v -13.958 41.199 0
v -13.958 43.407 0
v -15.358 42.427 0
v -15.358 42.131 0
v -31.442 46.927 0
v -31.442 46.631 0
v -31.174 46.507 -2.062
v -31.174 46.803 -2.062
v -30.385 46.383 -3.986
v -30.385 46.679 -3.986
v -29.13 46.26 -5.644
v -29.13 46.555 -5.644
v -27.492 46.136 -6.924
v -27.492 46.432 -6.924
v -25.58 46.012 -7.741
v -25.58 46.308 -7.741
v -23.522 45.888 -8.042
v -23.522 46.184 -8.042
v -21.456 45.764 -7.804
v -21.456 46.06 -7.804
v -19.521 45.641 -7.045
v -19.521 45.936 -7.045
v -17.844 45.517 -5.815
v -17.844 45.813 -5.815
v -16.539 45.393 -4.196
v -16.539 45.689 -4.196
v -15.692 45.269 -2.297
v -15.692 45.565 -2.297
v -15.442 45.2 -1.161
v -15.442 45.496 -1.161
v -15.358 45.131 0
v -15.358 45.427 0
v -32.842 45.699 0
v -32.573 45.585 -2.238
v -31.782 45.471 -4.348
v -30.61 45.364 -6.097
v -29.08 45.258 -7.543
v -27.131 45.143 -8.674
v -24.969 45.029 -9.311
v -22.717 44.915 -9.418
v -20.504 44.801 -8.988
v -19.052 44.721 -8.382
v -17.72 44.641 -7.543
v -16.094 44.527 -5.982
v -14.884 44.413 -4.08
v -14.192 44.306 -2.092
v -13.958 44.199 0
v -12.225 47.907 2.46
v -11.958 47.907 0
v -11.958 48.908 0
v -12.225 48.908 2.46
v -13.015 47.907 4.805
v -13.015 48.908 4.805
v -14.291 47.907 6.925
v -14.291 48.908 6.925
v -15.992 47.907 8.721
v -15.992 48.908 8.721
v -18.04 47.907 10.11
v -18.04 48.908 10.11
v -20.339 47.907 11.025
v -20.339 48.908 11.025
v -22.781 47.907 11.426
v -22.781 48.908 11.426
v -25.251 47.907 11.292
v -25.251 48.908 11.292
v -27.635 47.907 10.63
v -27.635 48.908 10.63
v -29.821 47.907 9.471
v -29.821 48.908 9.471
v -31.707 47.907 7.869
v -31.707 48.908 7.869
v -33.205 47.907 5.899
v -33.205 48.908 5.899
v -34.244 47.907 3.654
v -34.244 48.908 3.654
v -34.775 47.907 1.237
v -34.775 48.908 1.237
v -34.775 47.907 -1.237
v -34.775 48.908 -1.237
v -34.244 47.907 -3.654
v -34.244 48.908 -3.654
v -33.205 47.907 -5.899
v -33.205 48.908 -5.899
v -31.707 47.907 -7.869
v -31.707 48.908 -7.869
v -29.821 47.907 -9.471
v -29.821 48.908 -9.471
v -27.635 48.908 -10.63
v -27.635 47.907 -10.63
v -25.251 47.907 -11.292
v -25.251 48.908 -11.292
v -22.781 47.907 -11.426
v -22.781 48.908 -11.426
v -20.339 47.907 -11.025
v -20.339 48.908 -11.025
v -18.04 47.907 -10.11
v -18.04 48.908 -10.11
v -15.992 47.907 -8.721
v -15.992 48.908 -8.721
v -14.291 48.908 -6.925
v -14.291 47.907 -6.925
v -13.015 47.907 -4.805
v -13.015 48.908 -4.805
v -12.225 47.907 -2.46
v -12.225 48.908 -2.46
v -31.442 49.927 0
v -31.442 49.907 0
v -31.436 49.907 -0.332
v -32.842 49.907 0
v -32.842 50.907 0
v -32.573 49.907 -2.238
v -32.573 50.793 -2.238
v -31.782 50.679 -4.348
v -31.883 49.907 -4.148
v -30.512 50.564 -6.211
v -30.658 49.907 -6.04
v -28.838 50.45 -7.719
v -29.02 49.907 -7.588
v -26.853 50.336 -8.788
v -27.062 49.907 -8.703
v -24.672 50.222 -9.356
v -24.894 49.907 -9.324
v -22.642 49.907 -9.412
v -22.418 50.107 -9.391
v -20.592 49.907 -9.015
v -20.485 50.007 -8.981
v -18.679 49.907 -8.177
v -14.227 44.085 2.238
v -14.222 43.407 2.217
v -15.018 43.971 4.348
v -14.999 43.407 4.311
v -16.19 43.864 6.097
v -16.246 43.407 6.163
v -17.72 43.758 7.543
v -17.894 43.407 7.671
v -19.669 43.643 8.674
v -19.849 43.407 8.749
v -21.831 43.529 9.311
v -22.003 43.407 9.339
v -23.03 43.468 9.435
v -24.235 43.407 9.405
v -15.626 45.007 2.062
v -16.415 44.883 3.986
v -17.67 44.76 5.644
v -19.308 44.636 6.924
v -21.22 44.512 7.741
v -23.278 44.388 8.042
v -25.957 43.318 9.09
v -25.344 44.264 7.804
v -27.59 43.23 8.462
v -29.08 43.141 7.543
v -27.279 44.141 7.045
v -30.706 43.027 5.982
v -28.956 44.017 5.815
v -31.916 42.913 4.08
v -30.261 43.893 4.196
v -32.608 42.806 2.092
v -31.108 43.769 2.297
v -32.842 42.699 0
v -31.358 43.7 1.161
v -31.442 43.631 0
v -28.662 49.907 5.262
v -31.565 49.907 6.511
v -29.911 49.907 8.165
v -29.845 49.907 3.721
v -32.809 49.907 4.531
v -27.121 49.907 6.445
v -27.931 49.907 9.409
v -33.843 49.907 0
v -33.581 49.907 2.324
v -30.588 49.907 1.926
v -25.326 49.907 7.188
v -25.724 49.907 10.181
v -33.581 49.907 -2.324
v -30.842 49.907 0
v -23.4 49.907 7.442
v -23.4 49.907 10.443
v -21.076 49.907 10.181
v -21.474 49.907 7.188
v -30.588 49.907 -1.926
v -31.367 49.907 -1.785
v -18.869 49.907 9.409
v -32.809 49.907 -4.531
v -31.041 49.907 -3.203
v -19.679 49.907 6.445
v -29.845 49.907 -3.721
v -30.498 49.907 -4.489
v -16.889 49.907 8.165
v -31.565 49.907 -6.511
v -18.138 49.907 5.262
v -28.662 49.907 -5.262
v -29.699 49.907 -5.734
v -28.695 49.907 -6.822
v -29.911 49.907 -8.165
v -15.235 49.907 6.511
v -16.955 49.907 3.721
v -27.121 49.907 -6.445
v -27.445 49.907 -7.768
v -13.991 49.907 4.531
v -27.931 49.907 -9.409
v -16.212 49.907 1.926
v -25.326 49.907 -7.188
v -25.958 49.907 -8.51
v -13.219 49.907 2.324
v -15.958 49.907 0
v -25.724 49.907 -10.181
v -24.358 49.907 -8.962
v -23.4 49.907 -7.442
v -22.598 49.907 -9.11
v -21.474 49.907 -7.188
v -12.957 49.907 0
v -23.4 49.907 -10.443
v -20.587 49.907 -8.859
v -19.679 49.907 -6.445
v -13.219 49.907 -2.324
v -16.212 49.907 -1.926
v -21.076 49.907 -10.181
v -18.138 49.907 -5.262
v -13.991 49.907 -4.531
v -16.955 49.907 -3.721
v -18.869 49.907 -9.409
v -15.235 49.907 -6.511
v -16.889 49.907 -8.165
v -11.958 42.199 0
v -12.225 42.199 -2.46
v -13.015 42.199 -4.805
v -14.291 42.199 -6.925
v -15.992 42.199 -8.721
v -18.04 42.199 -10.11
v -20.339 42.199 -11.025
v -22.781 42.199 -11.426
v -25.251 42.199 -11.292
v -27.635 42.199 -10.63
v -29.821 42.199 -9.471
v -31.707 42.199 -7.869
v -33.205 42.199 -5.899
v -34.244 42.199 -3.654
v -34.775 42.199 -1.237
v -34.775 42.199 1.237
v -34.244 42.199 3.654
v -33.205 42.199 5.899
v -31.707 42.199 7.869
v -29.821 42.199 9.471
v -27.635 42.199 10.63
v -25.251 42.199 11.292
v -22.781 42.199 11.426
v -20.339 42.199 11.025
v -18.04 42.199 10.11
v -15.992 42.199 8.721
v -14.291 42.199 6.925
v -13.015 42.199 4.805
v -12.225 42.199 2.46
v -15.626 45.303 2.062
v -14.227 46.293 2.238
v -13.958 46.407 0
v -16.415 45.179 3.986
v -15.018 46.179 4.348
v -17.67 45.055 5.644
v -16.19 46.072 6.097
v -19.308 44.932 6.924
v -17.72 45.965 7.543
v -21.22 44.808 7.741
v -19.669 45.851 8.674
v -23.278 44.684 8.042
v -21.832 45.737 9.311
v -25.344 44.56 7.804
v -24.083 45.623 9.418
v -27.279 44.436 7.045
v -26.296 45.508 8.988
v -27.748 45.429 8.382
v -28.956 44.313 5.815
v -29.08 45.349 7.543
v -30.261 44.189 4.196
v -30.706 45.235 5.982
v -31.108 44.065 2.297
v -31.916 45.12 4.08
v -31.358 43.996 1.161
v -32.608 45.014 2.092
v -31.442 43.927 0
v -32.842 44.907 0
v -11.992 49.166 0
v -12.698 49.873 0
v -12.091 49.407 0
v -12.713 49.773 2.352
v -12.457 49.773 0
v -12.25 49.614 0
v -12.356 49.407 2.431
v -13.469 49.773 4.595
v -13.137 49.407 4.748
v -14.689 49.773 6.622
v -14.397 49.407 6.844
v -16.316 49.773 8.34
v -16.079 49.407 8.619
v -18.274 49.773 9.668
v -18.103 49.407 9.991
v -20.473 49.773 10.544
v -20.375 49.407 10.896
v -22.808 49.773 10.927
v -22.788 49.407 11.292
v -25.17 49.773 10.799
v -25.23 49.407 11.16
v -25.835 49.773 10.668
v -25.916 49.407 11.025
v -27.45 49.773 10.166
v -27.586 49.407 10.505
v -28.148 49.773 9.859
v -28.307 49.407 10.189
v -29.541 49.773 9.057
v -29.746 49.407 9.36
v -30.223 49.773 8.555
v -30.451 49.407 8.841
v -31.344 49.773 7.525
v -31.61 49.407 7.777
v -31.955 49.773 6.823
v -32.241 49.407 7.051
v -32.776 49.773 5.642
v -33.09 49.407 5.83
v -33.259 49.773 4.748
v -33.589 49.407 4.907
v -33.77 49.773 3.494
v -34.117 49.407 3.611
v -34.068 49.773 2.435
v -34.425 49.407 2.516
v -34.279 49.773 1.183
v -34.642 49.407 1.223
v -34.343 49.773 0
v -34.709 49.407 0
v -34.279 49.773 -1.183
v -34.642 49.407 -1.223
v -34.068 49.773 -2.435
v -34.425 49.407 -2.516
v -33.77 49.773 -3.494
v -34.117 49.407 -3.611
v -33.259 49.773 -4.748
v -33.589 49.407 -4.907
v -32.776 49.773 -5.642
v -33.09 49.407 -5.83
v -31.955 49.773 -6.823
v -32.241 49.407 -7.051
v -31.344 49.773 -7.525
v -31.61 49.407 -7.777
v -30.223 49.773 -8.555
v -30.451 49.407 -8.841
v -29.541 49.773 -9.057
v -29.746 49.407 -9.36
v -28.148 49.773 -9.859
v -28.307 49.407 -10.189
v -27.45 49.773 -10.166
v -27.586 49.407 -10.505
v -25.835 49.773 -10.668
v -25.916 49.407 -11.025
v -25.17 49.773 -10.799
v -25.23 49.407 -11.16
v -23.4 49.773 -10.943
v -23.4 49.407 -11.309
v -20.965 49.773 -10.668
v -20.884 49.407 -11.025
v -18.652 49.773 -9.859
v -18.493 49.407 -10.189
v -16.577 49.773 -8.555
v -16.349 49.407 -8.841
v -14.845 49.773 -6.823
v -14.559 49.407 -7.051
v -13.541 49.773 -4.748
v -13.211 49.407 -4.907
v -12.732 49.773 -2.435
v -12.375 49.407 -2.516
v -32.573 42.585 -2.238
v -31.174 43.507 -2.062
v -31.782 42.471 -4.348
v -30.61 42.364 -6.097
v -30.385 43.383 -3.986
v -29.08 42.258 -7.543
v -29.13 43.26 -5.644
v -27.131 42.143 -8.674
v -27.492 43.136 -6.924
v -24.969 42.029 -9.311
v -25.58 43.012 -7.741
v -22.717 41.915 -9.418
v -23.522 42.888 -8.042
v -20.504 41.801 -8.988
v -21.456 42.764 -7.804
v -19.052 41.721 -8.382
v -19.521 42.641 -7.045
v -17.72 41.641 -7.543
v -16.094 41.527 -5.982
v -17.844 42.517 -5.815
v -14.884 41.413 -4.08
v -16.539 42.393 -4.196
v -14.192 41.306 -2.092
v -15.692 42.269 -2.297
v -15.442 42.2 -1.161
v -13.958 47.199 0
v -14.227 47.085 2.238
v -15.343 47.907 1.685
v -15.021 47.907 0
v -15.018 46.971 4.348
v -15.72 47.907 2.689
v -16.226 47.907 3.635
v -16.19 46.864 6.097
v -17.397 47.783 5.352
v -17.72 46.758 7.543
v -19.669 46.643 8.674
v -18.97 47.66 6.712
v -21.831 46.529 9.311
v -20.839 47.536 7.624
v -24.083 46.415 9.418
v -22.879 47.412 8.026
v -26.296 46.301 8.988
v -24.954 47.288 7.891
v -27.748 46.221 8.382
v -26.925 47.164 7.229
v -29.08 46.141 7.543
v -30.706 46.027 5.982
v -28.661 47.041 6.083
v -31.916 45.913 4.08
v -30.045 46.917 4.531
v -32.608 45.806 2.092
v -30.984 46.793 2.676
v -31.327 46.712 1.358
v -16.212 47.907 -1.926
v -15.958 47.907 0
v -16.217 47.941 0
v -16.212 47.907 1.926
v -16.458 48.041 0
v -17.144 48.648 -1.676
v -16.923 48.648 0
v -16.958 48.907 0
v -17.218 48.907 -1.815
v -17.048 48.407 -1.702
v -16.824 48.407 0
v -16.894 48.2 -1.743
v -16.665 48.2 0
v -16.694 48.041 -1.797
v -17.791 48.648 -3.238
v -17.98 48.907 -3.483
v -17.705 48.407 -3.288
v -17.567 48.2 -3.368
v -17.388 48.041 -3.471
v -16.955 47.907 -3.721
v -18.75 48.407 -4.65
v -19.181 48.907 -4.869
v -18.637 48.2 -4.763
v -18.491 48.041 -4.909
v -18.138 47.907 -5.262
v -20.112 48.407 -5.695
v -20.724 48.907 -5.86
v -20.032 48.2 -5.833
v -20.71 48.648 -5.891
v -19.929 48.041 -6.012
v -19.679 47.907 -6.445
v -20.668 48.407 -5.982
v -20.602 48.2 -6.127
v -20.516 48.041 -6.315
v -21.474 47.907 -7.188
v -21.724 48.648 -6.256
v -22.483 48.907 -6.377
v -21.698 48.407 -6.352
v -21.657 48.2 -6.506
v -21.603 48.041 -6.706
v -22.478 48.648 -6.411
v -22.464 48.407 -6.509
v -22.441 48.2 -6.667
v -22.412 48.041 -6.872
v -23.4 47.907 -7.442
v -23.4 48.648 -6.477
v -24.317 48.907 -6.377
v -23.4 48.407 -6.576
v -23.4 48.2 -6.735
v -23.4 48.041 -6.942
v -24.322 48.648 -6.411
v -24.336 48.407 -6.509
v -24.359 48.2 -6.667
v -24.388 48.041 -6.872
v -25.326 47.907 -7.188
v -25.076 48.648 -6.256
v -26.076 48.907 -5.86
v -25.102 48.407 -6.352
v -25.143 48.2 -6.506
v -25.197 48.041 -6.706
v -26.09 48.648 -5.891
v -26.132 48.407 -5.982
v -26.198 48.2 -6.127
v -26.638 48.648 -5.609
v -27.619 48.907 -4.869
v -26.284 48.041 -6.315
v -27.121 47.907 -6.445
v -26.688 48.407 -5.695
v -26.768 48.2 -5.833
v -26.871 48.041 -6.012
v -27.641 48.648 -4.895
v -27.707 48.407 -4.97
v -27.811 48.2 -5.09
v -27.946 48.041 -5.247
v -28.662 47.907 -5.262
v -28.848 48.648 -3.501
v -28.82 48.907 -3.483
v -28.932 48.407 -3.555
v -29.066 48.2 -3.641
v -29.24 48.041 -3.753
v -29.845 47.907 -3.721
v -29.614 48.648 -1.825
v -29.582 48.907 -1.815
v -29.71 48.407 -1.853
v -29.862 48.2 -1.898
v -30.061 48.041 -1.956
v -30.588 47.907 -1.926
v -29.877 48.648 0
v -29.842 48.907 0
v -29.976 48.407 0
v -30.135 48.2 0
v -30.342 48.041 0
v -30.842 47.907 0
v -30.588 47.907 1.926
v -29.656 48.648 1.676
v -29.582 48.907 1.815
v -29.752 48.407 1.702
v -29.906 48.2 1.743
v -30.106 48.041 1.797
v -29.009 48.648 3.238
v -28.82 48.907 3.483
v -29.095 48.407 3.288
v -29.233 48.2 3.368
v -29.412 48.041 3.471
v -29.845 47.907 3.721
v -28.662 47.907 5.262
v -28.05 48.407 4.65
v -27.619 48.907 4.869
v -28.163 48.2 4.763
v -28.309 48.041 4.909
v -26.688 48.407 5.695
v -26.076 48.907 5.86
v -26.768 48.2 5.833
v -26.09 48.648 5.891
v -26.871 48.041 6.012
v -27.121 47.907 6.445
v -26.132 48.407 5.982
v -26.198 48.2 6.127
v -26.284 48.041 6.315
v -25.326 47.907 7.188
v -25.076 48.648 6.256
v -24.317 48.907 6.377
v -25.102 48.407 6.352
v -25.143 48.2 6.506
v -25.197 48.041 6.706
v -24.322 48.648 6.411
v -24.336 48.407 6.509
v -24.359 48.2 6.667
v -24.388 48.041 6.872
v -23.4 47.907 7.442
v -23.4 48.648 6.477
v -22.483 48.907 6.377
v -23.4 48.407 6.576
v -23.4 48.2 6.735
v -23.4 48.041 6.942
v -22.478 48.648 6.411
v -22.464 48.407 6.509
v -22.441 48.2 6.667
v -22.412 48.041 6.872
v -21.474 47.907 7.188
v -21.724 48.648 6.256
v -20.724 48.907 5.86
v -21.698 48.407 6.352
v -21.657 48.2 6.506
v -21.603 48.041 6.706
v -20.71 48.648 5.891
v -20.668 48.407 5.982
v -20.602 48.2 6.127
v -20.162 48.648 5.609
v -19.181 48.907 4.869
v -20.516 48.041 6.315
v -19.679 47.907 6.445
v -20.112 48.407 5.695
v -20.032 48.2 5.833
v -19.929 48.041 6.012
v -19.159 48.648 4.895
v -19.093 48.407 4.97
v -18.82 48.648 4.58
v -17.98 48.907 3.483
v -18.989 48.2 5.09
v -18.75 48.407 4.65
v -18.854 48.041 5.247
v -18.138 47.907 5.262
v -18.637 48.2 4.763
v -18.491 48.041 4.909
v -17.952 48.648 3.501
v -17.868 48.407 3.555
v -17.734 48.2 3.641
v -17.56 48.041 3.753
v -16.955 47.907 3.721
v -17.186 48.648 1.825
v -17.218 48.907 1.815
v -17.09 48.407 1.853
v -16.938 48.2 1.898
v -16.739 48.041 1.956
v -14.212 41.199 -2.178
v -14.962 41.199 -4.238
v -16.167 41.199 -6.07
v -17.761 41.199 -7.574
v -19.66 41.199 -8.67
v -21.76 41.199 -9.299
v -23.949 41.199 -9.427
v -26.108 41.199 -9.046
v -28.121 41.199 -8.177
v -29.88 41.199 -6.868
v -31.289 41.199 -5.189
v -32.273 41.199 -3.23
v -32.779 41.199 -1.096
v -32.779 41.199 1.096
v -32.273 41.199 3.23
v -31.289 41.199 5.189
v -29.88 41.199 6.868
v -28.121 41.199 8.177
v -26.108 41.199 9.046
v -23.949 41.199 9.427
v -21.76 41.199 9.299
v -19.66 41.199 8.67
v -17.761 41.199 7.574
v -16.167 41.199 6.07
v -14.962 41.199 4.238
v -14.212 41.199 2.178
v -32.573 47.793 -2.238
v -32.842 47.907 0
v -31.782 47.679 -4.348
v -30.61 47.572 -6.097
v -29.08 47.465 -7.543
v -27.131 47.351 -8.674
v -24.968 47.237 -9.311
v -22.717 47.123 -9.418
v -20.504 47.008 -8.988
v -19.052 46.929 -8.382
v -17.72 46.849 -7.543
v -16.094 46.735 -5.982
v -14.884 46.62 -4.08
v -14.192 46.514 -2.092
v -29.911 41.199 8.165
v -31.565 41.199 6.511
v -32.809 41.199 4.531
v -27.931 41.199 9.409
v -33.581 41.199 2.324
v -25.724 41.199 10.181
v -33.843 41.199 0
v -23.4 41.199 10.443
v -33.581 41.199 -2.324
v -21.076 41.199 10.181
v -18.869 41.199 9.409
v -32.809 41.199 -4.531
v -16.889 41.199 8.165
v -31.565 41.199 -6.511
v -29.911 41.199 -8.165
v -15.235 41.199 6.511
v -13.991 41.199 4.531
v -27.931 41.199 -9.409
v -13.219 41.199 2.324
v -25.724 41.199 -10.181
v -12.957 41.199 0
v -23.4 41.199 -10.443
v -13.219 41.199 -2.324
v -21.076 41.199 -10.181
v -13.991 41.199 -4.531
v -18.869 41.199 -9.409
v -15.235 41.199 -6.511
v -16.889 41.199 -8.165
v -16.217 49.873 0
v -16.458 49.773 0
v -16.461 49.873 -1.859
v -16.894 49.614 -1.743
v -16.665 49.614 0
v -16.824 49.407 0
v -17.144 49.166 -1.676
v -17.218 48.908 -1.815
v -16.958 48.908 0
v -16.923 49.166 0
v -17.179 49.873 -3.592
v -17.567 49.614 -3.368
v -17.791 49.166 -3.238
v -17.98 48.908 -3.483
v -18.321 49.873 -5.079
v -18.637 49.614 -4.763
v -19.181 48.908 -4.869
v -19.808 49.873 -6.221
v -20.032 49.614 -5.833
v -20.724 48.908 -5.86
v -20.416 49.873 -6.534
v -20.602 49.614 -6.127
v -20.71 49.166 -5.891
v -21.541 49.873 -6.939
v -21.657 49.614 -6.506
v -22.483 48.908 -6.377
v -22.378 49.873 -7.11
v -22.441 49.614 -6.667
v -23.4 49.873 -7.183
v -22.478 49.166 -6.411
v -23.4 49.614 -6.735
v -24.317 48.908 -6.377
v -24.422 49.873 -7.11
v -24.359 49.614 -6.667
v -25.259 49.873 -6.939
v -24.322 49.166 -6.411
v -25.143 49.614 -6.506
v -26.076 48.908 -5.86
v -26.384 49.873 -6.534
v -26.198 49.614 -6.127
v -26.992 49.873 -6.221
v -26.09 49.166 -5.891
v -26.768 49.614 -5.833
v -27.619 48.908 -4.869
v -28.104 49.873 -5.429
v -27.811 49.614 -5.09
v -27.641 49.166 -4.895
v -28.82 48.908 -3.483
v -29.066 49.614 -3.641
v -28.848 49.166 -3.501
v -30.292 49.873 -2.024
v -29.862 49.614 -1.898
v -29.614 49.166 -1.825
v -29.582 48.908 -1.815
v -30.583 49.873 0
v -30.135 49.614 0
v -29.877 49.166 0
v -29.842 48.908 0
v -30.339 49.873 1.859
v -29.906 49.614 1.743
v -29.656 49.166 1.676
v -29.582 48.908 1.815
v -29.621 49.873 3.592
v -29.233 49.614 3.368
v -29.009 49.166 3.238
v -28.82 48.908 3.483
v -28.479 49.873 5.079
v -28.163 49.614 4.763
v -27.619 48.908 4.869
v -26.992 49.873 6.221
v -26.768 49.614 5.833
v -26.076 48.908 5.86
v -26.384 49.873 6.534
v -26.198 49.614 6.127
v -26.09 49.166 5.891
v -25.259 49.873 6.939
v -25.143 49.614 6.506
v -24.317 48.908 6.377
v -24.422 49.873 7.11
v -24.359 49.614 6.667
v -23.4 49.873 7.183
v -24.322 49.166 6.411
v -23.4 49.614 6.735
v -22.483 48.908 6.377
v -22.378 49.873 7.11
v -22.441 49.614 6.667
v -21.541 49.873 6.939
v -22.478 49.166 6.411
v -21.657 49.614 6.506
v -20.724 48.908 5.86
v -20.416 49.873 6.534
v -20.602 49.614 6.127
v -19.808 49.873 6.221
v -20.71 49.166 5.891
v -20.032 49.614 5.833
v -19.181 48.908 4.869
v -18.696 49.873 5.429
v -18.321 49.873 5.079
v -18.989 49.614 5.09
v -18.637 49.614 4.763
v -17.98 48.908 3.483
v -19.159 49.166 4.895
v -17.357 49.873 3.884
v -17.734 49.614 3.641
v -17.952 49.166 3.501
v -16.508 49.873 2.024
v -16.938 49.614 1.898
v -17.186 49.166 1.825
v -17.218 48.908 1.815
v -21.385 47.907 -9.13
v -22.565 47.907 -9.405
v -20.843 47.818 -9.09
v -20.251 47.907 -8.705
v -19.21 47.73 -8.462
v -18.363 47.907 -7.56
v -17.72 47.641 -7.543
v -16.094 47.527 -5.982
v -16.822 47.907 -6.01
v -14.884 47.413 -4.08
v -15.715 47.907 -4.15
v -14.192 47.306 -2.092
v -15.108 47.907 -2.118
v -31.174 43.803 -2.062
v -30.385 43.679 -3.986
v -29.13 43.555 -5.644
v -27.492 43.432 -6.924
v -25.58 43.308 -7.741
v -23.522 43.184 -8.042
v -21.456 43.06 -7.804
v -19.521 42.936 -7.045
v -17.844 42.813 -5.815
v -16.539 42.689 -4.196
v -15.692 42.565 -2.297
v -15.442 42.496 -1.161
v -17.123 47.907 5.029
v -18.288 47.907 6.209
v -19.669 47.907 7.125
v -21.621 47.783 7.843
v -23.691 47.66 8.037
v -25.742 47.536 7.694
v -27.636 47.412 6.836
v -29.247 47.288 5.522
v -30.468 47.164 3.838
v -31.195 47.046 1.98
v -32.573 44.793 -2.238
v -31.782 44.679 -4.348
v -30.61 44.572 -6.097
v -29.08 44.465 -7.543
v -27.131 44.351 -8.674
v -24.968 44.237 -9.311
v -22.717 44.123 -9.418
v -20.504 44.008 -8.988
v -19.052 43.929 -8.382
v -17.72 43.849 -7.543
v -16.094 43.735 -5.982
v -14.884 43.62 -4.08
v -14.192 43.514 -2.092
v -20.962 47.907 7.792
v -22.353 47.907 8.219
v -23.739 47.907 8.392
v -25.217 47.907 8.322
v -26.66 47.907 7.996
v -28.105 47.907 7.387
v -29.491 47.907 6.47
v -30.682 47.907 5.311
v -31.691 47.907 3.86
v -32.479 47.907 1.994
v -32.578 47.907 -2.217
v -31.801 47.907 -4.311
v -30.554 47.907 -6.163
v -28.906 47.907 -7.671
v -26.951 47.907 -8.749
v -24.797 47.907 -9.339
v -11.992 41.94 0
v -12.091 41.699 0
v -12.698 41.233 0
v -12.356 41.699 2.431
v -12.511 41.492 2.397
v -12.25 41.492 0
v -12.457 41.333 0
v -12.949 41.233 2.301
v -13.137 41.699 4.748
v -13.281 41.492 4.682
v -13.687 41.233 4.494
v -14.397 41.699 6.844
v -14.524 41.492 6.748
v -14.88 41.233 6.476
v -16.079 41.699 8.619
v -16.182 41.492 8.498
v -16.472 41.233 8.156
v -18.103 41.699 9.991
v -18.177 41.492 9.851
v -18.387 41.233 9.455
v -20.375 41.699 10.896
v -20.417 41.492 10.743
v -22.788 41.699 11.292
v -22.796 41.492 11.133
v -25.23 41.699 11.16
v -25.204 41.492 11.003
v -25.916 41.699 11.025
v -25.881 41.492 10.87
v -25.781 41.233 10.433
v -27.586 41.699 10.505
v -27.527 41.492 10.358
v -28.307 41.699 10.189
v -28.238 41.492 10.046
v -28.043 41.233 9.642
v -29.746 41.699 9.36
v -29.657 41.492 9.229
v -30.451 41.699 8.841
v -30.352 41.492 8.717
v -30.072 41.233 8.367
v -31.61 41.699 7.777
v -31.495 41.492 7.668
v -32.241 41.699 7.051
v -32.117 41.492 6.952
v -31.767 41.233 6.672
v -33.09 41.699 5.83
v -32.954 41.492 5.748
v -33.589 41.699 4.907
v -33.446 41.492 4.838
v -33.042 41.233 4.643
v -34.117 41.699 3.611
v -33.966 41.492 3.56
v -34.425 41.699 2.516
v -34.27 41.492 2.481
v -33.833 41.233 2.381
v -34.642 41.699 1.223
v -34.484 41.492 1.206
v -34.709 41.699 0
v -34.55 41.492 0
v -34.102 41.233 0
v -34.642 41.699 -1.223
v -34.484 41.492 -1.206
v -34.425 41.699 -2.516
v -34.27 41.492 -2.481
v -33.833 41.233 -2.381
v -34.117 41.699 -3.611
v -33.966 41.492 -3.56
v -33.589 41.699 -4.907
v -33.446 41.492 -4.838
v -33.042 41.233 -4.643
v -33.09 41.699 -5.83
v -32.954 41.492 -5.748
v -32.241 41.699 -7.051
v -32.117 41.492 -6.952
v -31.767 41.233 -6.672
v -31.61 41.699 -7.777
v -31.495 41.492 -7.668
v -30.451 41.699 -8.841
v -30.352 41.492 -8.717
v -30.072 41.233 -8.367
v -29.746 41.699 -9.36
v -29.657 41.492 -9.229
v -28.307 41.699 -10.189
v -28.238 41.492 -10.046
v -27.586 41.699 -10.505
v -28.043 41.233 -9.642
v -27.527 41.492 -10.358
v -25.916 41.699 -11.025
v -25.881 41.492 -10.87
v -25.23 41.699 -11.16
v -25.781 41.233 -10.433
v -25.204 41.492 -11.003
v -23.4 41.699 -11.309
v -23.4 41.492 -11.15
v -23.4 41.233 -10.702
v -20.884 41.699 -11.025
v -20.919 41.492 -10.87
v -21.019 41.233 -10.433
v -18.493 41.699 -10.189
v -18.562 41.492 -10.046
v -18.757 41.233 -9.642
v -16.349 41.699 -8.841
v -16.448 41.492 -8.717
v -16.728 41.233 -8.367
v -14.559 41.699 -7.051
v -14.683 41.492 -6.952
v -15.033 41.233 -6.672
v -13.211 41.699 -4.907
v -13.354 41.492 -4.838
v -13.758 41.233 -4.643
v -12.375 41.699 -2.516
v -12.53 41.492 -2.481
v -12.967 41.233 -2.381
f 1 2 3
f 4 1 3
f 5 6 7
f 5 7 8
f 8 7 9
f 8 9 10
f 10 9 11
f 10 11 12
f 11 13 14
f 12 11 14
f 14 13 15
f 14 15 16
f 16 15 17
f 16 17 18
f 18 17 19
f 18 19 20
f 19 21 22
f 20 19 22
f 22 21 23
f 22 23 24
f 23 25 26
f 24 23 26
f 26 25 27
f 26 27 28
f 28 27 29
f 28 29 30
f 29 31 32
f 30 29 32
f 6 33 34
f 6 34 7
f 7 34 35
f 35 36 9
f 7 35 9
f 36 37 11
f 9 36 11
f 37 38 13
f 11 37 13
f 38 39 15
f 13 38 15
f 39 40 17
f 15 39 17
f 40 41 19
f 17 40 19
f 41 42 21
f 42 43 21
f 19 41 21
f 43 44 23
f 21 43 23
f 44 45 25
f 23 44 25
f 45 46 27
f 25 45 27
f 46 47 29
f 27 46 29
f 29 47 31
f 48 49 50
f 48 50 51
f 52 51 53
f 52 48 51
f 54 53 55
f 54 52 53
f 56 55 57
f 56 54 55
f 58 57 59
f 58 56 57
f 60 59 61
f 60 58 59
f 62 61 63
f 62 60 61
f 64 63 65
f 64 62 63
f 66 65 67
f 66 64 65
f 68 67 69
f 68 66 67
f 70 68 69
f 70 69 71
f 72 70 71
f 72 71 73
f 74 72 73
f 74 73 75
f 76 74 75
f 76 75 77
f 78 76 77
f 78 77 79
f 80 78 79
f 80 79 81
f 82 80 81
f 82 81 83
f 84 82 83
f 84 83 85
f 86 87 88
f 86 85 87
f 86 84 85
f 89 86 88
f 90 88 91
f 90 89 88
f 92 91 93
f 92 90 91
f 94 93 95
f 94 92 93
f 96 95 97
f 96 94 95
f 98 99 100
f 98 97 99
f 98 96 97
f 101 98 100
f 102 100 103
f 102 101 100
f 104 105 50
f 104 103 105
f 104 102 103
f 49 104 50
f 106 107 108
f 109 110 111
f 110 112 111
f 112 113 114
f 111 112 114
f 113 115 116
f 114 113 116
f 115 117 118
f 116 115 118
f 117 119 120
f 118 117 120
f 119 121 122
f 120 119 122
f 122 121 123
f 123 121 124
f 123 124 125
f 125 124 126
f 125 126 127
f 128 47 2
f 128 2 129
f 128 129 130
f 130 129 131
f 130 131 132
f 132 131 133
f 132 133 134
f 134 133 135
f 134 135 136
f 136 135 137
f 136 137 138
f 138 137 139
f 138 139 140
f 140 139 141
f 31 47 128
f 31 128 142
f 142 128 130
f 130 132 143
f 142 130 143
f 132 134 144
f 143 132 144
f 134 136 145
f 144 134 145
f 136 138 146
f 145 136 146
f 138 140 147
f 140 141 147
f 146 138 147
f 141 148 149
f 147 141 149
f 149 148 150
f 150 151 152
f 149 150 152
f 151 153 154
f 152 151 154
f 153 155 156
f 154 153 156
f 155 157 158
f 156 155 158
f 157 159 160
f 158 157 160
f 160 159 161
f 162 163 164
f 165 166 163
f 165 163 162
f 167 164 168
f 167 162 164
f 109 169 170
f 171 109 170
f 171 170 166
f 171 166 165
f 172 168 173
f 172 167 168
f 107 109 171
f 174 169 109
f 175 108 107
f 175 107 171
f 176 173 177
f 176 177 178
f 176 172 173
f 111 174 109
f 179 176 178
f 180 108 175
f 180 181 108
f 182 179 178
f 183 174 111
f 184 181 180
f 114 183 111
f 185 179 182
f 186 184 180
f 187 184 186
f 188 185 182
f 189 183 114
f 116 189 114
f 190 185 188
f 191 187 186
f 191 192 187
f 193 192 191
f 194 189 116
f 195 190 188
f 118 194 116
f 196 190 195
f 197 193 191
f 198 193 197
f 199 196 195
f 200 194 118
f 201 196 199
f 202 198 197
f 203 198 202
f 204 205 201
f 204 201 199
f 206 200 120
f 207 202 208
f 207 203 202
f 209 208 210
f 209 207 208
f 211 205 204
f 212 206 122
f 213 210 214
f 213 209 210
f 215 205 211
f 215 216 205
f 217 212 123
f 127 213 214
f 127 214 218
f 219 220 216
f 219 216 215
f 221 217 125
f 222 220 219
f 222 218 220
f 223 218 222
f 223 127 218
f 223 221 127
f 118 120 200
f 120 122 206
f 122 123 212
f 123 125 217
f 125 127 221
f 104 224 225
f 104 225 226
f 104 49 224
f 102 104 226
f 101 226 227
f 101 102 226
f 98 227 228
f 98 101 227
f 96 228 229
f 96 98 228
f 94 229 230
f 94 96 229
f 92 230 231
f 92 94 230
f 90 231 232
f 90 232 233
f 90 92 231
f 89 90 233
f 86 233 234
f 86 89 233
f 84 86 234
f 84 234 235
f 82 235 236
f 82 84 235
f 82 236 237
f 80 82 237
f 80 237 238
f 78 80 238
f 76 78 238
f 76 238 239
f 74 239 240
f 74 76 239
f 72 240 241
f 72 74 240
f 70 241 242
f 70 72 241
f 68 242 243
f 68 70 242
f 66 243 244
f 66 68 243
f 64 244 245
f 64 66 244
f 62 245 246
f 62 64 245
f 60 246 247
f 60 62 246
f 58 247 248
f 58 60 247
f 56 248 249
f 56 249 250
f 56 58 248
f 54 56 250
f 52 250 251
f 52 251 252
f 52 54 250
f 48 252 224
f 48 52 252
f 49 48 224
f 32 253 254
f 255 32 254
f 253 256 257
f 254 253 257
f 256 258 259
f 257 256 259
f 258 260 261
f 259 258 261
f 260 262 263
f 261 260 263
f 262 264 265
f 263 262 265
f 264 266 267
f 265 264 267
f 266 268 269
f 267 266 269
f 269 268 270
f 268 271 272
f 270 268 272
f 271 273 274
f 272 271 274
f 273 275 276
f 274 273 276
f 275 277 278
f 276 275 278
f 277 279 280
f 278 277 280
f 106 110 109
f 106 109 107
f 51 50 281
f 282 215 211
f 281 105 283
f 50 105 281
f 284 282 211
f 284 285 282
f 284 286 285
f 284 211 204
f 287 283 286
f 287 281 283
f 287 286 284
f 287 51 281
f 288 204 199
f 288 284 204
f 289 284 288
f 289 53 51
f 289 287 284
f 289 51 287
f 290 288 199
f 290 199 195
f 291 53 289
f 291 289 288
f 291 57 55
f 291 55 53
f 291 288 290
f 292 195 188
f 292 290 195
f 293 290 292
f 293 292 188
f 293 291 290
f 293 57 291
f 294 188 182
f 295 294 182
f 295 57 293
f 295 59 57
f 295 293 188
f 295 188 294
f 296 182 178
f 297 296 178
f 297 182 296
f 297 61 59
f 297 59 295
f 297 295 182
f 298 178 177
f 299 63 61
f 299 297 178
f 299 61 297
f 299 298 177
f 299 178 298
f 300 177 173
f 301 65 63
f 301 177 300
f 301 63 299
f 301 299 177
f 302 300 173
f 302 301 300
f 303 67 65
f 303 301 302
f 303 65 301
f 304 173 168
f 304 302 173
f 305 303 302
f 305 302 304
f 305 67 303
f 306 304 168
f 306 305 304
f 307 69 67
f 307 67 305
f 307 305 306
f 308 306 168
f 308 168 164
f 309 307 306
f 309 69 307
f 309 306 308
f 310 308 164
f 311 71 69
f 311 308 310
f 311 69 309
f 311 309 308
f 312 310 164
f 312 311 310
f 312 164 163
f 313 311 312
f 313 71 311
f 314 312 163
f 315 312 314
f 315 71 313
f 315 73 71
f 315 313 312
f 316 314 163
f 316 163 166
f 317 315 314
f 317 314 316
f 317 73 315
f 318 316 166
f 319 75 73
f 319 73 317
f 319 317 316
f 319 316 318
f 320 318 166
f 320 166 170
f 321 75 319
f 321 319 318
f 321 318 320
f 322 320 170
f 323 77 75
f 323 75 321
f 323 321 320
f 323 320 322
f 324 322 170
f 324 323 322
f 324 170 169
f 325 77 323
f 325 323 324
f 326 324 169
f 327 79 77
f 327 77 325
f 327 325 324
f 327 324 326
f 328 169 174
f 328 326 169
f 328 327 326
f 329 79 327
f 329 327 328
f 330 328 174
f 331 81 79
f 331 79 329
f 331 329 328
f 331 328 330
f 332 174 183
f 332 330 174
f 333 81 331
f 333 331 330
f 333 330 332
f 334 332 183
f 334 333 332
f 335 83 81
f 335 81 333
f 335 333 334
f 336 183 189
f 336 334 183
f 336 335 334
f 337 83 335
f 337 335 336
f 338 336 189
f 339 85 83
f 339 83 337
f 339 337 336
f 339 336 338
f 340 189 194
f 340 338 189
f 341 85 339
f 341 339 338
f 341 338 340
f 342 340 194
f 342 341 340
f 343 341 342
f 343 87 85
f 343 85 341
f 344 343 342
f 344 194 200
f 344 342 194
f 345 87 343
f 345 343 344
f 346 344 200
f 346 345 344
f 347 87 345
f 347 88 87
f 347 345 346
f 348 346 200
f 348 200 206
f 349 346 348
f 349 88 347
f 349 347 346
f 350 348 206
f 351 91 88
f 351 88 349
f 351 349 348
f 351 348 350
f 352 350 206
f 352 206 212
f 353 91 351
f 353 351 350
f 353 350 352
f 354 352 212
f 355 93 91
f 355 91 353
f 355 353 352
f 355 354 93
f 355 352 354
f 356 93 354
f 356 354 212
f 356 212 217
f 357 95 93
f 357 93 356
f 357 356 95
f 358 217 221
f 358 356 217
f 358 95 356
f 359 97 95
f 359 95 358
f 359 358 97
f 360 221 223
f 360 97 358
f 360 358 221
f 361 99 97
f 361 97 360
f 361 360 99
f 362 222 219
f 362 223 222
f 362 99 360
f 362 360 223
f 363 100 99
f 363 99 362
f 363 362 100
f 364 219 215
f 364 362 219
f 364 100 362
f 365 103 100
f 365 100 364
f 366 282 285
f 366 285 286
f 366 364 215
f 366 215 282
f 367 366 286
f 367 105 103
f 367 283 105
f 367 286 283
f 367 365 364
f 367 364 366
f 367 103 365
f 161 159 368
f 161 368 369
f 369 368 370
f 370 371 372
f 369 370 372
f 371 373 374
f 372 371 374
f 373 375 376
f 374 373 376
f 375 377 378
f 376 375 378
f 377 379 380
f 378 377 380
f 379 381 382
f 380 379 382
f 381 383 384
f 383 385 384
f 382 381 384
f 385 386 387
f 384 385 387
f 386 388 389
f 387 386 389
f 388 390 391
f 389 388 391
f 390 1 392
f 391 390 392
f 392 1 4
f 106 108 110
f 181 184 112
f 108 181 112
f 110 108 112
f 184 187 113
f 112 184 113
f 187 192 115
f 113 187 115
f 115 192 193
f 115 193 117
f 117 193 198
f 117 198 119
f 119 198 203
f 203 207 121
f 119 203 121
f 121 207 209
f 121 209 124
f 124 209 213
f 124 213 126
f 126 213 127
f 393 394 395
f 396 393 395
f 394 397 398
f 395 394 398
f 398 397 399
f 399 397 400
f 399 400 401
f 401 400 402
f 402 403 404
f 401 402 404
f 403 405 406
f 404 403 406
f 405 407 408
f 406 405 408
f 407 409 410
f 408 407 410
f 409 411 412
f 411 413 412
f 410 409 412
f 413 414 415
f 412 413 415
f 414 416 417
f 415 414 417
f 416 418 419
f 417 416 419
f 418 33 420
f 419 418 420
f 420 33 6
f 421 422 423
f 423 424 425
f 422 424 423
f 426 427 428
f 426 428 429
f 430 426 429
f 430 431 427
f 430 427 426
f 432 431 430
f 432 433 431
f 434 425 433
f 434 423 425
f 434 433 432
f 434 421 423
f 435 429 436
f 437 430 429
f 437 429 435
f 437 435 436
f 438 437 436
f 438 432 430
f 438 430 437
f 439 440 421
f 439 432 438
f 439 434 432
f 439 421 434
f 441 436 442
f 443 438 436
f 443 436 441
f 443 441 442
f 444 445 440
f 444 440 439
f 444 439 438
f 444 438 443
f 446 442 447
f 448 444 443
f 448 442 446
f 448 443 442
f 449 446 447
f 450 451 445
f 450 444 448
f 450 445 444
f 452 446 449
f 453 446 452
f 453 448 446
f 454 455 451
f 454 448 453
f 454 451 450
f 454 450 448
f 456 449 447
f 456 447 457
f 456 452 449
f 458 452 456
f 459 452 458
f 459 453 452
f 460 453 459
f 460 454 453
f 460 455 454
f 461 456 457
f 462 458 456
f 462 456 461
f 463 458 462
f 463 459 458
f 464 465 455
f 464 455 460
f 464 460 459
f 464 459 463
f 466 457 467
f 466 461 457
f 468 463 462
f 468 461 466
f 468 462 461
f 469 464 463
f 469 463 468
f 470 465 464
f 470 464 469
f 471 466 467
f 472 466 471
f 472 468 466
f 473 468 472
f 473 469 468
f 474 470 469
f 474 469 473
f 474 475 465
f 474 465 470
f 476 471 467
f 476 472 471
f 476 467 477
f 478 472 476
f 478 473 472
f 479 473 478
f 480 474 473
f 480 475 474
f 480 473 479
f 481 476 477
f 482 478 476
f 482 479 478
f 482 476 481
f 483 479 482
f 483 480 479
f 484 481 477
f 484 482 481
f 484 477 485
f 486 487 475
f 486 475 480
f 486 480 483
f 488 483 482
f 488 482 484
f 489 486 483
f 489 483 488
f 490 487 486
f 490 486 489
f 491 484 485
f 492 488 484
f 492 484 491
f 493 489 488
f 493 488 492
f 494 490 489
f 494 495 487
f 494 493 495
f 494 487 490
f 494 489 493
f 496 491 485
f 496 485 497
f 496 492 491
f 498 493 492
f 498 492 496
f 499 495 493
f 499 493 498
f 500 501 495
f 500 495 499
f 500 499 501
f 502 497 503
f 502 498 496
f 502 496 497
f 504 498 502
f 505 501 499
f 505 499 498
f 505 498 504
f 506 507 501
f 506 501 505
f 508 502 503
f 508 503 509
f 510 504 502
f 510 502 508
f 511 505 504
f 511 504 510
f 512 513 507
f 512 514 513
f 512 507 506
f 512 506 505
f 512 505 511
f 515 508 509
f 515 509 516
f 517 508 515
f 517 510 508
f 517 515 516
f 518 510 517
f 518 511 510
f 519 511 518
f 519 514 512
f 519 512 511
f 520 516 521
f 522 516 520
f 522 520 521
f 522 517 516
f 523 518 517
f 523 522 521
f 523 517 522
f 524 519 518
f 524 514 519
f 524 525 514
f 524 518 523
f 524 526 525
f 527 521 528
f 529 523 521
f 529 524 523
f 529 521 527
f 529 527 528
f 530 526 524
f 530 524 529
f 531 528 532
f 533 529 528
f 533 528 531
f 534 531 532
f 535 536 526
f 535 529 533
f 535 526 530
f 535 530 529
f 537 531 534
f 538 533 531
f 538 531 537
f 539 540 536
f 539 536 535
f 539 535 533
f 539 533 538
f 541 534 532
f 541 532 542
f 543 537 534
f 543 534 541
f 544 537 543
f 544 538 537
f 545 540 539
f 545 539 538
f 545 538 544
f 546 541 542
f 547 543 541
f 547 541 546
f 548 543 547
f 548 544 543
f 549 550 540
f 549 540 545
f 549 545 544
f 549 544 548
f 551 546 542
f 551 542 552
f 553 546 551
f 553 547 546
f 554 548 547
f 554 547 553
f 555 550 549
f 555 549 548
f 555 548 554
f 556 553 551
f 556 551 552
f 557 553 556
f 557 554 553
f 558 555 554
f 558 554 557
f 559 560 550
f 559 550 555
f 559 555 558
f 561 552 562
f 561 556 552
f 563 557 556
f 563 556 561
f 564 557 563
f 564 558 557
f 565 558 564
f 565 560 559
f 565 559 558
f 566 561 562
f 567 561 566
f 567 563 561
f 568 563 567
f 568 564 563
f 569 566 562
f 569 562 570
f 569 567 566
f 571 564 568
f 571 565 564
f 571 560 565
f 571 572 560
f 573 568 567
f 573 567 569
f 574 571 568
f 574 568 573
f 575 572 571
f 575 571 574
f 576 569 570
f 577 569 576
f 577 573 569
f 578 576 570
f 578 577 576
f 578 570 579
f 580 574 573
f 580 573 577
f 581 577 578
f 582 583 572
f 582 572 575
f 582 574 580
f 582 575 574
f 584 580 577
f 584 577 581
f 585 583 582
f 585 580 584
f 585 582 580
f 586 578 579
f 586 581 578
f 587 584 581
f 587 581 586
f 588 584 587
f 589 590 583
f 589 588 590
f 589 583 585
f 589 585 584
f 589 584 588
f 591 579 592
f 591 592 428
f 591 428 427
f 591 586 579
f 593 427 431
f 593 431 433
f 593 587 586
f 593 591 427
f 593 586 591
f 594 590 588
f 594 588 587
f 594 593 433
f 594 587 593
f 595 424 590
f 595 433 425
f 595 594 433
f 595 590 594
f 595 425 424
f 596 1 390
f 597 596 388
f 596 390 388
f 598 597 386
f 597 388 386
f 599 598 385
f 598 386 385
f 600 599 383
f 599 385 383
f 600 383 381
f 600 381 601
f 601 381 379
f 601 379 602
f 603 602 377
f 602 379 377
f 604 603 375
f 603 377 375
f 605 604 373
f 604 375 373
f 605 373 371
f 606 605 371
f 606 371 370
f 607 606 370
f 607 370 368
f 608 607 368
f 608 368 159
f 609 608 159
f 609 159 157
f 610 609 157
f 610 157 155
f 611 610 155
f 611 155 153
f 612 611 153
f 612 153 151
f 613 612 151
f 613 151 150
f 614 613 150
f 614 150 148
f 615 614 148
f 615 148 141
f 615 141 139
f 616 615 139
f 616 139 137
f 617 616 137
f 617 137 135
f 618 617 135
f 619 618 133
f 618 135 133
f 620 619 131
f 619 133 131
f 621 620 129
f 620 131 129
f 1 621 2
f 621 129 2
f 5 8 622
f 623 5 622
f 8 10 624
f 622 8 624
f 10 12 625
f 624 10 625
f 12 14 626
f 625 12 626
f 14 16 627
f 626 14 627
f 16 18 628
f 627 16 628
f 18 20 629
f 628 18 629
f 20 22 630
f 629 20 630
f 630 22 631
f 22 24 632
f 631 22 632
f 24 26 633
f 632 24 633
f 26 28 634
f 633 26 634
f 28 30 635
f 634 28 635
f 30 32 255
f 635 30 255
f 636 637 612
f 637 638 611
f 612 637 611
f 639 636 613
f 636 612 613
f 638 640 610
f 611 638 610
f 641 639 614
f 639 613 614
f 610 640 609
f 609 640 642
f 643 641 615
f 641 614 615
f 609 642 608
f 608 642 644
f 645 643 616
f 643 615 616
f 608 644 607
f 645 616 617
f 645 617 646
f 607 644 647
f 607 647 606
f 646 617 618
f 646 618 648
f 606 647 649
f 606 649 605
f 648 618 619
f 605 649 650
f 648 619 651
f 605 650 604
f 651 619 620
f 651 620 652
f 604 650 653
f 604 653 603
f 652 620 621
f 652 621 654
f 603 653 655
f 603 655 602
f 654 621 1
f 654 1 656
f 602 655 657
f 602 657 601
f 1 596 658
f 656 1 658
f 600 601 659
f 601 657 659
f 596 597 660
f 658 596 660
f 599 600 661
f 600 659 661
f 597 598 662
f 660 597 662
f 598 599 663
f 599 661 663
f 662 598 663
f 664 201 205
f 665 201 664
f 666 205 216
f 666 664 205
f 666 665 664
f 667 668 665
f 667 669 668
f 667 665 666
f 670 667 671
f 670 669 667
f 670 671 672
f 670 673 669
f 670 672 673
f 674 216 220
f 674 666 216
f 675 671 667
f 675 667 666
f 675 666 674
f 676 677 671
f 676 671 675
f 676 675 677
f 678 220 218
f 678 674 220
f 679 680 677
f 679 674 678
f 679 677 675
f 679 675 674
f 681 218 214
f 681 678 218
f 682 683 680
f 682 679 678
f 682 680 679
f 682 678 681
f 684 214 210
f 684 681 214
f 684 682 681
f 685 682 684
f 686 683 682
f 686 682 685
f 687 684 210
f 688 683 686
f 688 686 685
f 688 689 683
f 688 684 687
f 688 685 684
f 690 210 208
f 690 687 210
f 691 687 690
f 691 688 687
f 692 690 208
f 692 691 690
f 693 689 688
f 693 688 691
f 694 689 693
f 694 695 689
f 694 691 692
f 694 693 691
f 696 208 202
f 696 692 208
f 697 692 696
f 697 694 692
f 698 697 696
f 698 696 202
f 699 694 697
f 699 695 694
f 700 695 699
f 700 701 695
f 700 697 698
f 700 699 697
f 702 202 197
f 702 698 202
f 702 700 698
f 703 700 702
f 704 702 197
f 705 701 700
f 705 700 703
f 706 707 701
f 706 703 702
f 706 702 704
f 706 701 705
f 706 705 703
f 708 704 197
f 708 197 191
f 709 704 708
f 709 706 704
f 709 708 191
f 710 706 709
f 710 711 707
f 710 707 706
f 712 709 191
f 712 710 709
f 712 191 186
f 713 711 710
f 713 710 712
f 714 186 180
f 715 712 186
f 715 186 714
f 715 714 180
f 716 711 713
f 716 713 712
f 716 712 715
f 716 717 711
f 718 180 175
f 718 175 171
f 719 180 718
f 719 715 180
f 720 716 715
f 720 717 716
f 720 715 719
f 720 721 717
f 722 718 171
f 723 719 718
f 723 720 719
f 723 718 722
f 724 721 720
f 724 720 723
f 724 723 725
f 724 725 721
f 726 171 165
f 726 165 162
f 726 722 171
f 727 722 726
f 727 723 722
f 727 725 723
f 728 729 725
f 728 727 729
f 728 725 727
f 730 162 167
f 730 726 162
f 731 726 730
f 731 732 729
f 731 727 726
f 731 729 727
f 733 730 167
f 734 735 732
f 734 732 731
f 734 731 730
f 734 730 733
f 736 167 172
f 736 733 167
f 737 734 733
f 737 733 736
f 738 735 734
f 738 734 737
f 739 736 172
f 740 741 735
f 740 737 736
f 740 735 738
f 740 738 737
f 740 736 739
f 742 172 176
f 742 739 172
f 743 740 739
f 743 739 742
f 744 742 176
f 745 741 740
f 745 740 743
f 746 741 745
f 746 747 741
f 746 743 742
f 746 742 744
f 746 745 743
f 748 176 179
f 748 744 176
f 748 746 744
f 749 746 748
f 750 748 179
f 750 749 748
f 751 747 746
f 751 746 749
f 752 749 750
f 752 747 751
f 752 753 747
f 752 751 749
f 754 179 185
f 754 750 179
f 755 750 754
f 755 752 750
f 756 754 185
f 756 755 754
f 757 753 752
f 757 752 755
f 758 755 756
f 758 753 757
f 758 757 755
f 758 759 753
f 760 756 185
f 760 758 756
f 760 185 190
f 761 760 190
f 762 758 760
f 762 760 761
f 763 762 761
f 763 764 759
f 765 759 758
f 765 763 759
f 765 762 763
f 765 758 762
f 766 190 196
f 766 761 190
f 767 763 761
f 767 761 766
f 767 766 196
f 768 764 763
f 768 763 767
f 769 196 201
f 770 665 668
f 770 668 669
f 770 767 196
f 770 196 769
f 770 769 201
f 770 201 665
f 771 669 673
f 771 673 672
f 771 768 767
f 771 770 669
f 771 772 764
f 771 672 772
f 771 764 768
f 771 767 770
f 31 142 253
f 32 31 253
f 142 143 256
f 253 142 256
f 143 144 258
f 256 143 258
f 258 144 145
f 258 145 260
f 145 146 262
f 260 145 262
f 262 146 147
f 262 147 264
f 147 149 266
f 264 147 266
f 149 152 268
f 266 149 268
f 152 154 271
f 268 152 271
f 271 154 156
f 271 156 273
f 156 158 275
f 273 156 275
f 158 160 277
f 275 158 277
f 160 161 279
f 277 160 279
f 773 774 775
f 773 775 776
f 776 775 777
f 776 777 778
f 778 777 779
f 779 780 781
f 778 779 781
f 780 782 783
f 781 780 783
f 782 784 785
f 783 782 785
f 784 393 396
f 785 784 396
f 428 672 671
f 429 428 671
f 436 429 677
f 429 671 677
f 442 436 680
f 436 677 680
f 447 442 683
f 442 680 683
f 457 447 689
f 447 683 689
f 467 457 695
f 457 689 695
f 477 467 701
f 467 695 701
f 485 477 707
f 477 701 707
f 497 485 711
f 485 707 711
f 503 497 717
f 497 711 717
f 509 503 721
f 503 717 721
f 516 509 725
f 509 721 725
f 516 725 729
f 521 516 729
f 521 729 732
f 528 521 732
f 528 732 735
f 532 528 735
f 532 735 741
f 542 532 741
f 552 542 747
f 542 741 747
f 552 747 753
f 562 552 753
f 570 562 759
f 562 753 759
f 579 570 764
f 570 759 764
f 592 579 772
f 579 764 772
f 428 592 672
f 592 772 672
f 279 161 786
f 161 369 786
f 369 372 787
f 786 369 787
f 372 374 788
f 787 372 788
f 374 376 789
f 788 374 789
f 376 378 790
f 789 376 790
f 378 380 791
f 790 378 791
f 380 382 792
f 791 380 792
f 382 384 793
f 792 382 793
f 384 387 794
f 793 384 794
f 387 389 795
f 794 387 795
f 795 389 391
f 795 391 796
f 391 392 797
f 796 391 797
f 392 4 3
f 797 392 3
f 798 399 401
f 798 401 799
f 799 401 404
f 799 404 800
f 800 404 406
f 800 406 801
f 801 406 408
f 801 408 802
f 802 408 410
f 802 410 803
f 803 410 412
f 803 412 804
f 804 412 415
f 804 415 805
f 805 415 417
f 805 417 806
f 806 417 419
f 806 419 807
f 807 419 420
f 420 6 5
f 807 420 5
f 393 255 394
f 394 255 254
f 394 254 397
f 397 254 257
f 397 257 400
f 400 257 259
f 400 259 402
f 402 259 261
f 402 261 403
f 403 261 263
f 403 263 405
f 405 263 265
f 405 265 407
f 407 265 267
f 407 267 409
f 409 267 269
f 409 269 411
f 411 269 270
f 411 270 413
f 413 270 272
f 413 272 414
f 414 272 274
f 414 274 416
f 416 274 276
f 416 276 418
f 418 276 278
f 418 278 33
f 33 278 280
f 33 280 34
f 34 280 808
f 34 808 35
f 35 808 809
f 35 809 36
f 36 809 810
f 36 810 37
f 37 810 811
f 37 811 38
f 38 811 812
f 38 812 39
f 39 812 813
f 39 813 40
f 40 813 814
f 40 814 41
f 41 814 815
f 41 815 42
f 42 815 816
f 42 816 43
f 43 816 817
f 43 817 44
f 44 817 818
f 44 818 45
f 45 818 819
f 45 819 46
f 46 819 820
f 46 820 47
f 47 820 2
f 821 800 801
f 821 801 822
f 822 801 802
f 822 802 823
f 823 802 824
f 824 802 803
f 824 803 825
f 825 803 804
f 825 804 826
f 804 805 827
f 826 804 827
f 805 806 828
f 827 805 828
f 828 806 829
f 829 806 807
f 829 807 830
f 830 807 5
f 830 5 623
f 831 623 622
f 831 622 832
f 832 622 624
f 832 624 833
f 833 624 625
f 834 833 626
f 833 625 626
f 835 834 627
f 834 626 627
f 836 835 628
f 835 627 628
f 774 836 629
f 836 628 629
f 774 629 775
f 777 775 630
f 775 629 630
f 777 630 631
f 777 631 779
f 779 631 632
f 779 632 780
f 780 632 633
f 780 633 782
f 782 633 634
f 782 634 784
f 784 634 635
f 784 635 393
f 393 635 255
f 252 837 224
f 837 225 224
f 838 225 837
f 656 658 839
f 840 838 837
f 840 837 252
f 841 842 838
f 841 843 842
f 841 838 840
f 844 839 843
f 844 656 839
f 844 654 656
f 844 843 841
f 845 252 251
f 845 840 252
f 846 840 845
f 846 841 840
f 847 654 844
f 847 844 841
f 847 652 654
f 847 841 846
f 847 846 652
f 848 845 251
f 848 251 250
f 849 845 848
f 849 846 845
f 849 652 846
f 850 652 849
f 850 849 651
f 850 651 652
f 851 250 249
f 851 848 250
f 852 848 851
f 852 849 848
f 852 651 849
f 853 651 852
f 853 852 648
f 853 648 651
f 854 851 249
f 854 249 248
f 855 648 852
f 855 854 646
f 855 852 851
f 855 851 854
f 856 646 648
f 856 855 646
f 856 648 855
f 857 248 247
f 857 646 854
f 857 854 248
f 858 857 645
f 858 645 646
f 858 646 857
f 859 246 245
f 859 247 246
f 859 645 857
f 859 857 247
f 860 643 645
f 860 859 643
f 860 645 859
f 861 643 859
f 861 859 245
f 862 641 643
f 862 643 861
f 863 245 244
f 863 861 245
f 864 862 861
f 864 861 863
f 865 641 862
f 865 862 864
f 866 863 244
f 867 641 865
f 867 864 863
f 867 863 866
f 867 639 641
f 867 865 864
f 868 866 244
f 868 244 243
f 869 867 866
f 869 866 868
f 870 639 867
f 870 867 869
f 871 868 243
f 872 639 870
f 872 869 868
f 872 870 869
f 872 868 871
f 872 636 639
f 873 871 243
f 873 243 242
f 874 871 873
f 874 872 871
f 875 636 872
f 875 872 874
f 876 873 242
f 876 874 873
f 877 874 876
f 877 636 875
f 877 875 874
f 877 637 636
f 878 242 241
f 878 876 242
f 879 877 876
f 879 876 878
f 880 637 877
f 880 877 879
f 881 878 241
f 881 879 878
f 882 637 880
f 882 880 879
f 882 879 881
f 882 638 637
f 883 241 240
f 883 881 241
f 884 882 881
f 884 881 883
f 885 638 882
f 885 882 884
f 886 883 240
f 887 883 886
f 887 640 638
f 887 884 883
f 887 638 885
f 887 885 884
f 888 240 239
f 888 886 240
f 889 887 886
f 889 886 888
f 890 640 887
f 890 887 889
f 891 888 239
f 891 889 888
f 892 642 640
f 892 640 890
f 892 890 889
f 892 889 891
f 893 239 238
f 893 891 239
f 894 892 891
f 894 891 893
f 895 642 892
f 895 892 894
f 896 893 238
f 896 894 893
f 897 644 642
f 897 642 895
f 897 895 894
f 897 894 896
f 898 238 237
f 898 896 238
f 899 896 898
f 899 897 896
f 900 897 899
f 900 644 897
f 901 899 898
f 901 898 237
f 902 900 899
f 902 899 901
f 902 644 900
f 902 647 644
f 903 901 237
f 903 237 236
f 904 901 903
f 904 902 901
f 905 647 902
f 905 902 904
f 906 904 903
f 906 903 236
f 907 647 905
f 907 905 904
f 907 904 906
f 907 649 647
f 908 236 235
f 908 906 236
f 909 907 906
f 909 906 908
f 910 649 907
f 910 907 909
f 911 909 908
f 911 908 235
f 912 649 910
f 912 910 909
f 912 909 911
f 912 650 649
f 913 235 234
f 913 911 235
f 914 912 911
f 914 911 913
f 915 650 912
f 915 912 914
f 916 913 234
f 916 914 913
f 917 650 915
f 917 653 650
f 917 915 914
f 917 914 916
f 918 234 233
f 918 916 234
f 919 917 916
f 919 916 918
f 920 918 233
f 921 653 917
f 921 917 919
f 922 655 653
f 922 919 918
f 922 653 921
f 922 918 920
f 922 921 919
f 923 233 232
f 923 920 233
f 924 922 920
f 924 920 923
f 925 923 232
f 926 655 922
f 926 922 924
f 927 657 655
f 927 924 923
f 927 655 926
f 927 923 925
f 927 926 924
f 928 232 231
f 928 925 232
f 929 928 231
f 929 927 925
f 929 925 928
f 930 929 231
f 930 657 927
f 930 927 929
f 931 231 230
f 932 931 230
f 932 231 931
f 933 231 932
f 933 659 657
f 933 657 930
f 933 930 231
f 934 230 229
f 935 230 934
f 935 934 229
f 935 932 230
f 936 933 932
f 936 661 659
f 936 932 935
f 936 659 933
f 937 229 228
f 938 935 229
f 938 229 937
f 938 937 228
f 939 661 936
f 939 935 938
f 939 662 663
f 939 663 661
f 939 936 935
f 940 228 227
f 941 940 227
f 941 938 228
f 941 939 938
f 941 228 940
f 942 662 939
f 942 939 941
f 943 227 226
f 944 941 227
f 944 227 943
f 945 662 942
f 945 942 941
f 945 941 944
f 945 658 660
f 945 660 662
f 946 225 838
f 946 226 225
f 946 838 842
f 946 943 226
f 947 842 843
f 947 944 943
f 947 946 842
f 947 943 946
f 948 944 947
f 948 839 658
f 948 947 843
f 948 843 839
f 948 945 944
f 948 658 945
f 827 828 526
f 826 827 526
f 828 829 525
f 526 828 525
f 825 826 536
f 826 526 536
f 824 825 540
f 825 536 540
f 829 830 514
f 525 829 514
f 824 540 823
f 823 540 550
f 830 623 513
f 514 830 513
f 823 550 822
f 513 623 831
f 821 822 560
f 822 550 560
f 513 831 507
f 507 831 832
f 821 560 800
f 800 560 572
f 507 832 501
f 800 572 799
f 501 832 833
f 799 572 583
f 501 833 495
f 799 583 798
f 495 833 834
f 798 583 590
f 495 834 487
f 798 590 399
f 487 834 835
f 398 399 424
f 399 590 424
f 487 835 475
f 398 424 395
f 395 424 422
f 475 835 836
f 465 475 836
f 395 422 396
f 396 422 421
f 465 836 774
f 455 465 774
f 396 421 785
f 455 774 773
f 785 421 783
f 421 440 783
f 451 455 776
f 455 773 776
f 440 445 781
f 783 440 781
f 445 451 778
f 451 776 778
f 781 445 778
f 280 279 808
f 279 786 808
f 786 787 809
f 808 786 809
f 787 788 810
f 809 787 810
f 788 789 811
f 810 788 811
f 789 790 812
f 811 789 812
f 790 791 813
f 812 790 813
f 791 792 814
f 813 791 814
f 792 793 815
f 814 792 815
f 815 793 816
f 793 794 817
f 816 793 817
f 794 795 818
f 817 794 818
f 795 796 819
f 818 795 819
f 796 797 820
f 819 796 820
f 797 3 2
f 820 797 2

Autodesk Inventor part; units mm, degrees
ref_plane "YZ Plane" through (0, 0, 0) normal (1, 0, 0) x (0, 1, 0)
ref_plane "XZ Plane" through (0, 0, 0) normal (0, 1, 0) x (-1, 0, 0)
ref_plane "XY Plane" through (0, 0, 0) normal (0, 0, 1) x (1, 0, 0)
ref_plane "Work Plane1" through (0, 46.8, 0) normal (0, 0, 1) x (-1, 0, 0)
sketch "Sketch2" plane through (0, 46.8, 0) normal (0, 0, 1) x (-1, 0, 0)
  spline S0 degree 3 number of poles 148
  spline S1 degree 3 number of poles 148
  line L0 (31.3425, -5.6798) -> (32.5946, -4.8031)
  line L1 (32.5946, -4.1553) -> (31.3425, -3.2786)
  line L2 (31.3425, -3.2786) -> (31.3425, -5.6037)
  line L3 (32.5946, -4.8031) -> (32.5946, -4.1553)
  line L4 (31.3425, 13.5614) -> (31.3425, -5.6037)
  line L5 (32.8425, -4.1071) -> (31.4425, -3.1268)
  line L6 (31.4425, -3.1268) -> (31.4425, -2.831)
  line L7 (31.4425, -2.831) -> (32.8425, -1.8994)
  line L8 (32.8425, -1.8994) -> (32.8425, -4.1071)
  point P0 (0, 46.8)
  point P1 (31.9686, -3.7169)
  point P2 (32.1425, -3.6169)
  point P3 (31.4425, -2.9789)
  dimension "d4" = 0
  dimension "d5" = 0.1
  dimension "d6" = 0.1
  dimension "d7" = 1.4
coil "Coil1" sketch "Sketch2" operation add axis through (-23.4, 35.1998, 0) along (0, -1, 0) pitch 3 turns 2.5 hand right contours L5 L6 L7 L8
sketch "Sketch3" plane through (0, 46.8, 0) normal (0, 0, 1) x (-1, 0, 0)
  line L0 (13.9575, 5.6006) -> (13.9575, 3.3929) projected
  line L1 (32.8425, -1.8994) -> (32.8425, -4.1071) projected
  line L2 (15.3575, 4.669) -> (13.9575, 5.6006) projected
  line L3 (13.9575, 5.6006) -> (11.9575, 5.6006)
  line L4 (11.9575, 5.6006) -> (11.9575, -1.1071)
  line L5 (11.9575, -1.1071) -> (13.9575, -1.1071)
  line L6 (13.9575, -1.1071) -> (13.9575, 5.6006)
  line L7 (11.9575, -1.1071) -> (16.9575, -1.1071)
  line L8 (16.9575, -1.1071) -> (16.9575, -3.1071)
  line L9 (16.9575, -3.1071) -> (11.9575, -3.1071)
  line L10 (11.9575, -3.1071) -> (11.9575, -1.1071)
  line L11 (23.4, 56.7814) -> (23.4, -13.0885) projected
  point P0 (0, 46.8)
  dimension "d16" = 2
  dimension "d17" = 5
  dimension "d18" = 2
revolve "Revolution2" add sketch "Sketch3" angle 360 about axis through (-23.4, 35.1998, 0) along (0, 1, 0)
fillet "Fillet1" radius 1 4 edges at (-34.8425, 49.9071, 0) (-29.8425, 49.9071, 0) (-29.8425, 47.9071, 0) (-34.8425, 41.1994, 0)
properties part number "20_Cube_4_insert_Photosensor_lenscap"
